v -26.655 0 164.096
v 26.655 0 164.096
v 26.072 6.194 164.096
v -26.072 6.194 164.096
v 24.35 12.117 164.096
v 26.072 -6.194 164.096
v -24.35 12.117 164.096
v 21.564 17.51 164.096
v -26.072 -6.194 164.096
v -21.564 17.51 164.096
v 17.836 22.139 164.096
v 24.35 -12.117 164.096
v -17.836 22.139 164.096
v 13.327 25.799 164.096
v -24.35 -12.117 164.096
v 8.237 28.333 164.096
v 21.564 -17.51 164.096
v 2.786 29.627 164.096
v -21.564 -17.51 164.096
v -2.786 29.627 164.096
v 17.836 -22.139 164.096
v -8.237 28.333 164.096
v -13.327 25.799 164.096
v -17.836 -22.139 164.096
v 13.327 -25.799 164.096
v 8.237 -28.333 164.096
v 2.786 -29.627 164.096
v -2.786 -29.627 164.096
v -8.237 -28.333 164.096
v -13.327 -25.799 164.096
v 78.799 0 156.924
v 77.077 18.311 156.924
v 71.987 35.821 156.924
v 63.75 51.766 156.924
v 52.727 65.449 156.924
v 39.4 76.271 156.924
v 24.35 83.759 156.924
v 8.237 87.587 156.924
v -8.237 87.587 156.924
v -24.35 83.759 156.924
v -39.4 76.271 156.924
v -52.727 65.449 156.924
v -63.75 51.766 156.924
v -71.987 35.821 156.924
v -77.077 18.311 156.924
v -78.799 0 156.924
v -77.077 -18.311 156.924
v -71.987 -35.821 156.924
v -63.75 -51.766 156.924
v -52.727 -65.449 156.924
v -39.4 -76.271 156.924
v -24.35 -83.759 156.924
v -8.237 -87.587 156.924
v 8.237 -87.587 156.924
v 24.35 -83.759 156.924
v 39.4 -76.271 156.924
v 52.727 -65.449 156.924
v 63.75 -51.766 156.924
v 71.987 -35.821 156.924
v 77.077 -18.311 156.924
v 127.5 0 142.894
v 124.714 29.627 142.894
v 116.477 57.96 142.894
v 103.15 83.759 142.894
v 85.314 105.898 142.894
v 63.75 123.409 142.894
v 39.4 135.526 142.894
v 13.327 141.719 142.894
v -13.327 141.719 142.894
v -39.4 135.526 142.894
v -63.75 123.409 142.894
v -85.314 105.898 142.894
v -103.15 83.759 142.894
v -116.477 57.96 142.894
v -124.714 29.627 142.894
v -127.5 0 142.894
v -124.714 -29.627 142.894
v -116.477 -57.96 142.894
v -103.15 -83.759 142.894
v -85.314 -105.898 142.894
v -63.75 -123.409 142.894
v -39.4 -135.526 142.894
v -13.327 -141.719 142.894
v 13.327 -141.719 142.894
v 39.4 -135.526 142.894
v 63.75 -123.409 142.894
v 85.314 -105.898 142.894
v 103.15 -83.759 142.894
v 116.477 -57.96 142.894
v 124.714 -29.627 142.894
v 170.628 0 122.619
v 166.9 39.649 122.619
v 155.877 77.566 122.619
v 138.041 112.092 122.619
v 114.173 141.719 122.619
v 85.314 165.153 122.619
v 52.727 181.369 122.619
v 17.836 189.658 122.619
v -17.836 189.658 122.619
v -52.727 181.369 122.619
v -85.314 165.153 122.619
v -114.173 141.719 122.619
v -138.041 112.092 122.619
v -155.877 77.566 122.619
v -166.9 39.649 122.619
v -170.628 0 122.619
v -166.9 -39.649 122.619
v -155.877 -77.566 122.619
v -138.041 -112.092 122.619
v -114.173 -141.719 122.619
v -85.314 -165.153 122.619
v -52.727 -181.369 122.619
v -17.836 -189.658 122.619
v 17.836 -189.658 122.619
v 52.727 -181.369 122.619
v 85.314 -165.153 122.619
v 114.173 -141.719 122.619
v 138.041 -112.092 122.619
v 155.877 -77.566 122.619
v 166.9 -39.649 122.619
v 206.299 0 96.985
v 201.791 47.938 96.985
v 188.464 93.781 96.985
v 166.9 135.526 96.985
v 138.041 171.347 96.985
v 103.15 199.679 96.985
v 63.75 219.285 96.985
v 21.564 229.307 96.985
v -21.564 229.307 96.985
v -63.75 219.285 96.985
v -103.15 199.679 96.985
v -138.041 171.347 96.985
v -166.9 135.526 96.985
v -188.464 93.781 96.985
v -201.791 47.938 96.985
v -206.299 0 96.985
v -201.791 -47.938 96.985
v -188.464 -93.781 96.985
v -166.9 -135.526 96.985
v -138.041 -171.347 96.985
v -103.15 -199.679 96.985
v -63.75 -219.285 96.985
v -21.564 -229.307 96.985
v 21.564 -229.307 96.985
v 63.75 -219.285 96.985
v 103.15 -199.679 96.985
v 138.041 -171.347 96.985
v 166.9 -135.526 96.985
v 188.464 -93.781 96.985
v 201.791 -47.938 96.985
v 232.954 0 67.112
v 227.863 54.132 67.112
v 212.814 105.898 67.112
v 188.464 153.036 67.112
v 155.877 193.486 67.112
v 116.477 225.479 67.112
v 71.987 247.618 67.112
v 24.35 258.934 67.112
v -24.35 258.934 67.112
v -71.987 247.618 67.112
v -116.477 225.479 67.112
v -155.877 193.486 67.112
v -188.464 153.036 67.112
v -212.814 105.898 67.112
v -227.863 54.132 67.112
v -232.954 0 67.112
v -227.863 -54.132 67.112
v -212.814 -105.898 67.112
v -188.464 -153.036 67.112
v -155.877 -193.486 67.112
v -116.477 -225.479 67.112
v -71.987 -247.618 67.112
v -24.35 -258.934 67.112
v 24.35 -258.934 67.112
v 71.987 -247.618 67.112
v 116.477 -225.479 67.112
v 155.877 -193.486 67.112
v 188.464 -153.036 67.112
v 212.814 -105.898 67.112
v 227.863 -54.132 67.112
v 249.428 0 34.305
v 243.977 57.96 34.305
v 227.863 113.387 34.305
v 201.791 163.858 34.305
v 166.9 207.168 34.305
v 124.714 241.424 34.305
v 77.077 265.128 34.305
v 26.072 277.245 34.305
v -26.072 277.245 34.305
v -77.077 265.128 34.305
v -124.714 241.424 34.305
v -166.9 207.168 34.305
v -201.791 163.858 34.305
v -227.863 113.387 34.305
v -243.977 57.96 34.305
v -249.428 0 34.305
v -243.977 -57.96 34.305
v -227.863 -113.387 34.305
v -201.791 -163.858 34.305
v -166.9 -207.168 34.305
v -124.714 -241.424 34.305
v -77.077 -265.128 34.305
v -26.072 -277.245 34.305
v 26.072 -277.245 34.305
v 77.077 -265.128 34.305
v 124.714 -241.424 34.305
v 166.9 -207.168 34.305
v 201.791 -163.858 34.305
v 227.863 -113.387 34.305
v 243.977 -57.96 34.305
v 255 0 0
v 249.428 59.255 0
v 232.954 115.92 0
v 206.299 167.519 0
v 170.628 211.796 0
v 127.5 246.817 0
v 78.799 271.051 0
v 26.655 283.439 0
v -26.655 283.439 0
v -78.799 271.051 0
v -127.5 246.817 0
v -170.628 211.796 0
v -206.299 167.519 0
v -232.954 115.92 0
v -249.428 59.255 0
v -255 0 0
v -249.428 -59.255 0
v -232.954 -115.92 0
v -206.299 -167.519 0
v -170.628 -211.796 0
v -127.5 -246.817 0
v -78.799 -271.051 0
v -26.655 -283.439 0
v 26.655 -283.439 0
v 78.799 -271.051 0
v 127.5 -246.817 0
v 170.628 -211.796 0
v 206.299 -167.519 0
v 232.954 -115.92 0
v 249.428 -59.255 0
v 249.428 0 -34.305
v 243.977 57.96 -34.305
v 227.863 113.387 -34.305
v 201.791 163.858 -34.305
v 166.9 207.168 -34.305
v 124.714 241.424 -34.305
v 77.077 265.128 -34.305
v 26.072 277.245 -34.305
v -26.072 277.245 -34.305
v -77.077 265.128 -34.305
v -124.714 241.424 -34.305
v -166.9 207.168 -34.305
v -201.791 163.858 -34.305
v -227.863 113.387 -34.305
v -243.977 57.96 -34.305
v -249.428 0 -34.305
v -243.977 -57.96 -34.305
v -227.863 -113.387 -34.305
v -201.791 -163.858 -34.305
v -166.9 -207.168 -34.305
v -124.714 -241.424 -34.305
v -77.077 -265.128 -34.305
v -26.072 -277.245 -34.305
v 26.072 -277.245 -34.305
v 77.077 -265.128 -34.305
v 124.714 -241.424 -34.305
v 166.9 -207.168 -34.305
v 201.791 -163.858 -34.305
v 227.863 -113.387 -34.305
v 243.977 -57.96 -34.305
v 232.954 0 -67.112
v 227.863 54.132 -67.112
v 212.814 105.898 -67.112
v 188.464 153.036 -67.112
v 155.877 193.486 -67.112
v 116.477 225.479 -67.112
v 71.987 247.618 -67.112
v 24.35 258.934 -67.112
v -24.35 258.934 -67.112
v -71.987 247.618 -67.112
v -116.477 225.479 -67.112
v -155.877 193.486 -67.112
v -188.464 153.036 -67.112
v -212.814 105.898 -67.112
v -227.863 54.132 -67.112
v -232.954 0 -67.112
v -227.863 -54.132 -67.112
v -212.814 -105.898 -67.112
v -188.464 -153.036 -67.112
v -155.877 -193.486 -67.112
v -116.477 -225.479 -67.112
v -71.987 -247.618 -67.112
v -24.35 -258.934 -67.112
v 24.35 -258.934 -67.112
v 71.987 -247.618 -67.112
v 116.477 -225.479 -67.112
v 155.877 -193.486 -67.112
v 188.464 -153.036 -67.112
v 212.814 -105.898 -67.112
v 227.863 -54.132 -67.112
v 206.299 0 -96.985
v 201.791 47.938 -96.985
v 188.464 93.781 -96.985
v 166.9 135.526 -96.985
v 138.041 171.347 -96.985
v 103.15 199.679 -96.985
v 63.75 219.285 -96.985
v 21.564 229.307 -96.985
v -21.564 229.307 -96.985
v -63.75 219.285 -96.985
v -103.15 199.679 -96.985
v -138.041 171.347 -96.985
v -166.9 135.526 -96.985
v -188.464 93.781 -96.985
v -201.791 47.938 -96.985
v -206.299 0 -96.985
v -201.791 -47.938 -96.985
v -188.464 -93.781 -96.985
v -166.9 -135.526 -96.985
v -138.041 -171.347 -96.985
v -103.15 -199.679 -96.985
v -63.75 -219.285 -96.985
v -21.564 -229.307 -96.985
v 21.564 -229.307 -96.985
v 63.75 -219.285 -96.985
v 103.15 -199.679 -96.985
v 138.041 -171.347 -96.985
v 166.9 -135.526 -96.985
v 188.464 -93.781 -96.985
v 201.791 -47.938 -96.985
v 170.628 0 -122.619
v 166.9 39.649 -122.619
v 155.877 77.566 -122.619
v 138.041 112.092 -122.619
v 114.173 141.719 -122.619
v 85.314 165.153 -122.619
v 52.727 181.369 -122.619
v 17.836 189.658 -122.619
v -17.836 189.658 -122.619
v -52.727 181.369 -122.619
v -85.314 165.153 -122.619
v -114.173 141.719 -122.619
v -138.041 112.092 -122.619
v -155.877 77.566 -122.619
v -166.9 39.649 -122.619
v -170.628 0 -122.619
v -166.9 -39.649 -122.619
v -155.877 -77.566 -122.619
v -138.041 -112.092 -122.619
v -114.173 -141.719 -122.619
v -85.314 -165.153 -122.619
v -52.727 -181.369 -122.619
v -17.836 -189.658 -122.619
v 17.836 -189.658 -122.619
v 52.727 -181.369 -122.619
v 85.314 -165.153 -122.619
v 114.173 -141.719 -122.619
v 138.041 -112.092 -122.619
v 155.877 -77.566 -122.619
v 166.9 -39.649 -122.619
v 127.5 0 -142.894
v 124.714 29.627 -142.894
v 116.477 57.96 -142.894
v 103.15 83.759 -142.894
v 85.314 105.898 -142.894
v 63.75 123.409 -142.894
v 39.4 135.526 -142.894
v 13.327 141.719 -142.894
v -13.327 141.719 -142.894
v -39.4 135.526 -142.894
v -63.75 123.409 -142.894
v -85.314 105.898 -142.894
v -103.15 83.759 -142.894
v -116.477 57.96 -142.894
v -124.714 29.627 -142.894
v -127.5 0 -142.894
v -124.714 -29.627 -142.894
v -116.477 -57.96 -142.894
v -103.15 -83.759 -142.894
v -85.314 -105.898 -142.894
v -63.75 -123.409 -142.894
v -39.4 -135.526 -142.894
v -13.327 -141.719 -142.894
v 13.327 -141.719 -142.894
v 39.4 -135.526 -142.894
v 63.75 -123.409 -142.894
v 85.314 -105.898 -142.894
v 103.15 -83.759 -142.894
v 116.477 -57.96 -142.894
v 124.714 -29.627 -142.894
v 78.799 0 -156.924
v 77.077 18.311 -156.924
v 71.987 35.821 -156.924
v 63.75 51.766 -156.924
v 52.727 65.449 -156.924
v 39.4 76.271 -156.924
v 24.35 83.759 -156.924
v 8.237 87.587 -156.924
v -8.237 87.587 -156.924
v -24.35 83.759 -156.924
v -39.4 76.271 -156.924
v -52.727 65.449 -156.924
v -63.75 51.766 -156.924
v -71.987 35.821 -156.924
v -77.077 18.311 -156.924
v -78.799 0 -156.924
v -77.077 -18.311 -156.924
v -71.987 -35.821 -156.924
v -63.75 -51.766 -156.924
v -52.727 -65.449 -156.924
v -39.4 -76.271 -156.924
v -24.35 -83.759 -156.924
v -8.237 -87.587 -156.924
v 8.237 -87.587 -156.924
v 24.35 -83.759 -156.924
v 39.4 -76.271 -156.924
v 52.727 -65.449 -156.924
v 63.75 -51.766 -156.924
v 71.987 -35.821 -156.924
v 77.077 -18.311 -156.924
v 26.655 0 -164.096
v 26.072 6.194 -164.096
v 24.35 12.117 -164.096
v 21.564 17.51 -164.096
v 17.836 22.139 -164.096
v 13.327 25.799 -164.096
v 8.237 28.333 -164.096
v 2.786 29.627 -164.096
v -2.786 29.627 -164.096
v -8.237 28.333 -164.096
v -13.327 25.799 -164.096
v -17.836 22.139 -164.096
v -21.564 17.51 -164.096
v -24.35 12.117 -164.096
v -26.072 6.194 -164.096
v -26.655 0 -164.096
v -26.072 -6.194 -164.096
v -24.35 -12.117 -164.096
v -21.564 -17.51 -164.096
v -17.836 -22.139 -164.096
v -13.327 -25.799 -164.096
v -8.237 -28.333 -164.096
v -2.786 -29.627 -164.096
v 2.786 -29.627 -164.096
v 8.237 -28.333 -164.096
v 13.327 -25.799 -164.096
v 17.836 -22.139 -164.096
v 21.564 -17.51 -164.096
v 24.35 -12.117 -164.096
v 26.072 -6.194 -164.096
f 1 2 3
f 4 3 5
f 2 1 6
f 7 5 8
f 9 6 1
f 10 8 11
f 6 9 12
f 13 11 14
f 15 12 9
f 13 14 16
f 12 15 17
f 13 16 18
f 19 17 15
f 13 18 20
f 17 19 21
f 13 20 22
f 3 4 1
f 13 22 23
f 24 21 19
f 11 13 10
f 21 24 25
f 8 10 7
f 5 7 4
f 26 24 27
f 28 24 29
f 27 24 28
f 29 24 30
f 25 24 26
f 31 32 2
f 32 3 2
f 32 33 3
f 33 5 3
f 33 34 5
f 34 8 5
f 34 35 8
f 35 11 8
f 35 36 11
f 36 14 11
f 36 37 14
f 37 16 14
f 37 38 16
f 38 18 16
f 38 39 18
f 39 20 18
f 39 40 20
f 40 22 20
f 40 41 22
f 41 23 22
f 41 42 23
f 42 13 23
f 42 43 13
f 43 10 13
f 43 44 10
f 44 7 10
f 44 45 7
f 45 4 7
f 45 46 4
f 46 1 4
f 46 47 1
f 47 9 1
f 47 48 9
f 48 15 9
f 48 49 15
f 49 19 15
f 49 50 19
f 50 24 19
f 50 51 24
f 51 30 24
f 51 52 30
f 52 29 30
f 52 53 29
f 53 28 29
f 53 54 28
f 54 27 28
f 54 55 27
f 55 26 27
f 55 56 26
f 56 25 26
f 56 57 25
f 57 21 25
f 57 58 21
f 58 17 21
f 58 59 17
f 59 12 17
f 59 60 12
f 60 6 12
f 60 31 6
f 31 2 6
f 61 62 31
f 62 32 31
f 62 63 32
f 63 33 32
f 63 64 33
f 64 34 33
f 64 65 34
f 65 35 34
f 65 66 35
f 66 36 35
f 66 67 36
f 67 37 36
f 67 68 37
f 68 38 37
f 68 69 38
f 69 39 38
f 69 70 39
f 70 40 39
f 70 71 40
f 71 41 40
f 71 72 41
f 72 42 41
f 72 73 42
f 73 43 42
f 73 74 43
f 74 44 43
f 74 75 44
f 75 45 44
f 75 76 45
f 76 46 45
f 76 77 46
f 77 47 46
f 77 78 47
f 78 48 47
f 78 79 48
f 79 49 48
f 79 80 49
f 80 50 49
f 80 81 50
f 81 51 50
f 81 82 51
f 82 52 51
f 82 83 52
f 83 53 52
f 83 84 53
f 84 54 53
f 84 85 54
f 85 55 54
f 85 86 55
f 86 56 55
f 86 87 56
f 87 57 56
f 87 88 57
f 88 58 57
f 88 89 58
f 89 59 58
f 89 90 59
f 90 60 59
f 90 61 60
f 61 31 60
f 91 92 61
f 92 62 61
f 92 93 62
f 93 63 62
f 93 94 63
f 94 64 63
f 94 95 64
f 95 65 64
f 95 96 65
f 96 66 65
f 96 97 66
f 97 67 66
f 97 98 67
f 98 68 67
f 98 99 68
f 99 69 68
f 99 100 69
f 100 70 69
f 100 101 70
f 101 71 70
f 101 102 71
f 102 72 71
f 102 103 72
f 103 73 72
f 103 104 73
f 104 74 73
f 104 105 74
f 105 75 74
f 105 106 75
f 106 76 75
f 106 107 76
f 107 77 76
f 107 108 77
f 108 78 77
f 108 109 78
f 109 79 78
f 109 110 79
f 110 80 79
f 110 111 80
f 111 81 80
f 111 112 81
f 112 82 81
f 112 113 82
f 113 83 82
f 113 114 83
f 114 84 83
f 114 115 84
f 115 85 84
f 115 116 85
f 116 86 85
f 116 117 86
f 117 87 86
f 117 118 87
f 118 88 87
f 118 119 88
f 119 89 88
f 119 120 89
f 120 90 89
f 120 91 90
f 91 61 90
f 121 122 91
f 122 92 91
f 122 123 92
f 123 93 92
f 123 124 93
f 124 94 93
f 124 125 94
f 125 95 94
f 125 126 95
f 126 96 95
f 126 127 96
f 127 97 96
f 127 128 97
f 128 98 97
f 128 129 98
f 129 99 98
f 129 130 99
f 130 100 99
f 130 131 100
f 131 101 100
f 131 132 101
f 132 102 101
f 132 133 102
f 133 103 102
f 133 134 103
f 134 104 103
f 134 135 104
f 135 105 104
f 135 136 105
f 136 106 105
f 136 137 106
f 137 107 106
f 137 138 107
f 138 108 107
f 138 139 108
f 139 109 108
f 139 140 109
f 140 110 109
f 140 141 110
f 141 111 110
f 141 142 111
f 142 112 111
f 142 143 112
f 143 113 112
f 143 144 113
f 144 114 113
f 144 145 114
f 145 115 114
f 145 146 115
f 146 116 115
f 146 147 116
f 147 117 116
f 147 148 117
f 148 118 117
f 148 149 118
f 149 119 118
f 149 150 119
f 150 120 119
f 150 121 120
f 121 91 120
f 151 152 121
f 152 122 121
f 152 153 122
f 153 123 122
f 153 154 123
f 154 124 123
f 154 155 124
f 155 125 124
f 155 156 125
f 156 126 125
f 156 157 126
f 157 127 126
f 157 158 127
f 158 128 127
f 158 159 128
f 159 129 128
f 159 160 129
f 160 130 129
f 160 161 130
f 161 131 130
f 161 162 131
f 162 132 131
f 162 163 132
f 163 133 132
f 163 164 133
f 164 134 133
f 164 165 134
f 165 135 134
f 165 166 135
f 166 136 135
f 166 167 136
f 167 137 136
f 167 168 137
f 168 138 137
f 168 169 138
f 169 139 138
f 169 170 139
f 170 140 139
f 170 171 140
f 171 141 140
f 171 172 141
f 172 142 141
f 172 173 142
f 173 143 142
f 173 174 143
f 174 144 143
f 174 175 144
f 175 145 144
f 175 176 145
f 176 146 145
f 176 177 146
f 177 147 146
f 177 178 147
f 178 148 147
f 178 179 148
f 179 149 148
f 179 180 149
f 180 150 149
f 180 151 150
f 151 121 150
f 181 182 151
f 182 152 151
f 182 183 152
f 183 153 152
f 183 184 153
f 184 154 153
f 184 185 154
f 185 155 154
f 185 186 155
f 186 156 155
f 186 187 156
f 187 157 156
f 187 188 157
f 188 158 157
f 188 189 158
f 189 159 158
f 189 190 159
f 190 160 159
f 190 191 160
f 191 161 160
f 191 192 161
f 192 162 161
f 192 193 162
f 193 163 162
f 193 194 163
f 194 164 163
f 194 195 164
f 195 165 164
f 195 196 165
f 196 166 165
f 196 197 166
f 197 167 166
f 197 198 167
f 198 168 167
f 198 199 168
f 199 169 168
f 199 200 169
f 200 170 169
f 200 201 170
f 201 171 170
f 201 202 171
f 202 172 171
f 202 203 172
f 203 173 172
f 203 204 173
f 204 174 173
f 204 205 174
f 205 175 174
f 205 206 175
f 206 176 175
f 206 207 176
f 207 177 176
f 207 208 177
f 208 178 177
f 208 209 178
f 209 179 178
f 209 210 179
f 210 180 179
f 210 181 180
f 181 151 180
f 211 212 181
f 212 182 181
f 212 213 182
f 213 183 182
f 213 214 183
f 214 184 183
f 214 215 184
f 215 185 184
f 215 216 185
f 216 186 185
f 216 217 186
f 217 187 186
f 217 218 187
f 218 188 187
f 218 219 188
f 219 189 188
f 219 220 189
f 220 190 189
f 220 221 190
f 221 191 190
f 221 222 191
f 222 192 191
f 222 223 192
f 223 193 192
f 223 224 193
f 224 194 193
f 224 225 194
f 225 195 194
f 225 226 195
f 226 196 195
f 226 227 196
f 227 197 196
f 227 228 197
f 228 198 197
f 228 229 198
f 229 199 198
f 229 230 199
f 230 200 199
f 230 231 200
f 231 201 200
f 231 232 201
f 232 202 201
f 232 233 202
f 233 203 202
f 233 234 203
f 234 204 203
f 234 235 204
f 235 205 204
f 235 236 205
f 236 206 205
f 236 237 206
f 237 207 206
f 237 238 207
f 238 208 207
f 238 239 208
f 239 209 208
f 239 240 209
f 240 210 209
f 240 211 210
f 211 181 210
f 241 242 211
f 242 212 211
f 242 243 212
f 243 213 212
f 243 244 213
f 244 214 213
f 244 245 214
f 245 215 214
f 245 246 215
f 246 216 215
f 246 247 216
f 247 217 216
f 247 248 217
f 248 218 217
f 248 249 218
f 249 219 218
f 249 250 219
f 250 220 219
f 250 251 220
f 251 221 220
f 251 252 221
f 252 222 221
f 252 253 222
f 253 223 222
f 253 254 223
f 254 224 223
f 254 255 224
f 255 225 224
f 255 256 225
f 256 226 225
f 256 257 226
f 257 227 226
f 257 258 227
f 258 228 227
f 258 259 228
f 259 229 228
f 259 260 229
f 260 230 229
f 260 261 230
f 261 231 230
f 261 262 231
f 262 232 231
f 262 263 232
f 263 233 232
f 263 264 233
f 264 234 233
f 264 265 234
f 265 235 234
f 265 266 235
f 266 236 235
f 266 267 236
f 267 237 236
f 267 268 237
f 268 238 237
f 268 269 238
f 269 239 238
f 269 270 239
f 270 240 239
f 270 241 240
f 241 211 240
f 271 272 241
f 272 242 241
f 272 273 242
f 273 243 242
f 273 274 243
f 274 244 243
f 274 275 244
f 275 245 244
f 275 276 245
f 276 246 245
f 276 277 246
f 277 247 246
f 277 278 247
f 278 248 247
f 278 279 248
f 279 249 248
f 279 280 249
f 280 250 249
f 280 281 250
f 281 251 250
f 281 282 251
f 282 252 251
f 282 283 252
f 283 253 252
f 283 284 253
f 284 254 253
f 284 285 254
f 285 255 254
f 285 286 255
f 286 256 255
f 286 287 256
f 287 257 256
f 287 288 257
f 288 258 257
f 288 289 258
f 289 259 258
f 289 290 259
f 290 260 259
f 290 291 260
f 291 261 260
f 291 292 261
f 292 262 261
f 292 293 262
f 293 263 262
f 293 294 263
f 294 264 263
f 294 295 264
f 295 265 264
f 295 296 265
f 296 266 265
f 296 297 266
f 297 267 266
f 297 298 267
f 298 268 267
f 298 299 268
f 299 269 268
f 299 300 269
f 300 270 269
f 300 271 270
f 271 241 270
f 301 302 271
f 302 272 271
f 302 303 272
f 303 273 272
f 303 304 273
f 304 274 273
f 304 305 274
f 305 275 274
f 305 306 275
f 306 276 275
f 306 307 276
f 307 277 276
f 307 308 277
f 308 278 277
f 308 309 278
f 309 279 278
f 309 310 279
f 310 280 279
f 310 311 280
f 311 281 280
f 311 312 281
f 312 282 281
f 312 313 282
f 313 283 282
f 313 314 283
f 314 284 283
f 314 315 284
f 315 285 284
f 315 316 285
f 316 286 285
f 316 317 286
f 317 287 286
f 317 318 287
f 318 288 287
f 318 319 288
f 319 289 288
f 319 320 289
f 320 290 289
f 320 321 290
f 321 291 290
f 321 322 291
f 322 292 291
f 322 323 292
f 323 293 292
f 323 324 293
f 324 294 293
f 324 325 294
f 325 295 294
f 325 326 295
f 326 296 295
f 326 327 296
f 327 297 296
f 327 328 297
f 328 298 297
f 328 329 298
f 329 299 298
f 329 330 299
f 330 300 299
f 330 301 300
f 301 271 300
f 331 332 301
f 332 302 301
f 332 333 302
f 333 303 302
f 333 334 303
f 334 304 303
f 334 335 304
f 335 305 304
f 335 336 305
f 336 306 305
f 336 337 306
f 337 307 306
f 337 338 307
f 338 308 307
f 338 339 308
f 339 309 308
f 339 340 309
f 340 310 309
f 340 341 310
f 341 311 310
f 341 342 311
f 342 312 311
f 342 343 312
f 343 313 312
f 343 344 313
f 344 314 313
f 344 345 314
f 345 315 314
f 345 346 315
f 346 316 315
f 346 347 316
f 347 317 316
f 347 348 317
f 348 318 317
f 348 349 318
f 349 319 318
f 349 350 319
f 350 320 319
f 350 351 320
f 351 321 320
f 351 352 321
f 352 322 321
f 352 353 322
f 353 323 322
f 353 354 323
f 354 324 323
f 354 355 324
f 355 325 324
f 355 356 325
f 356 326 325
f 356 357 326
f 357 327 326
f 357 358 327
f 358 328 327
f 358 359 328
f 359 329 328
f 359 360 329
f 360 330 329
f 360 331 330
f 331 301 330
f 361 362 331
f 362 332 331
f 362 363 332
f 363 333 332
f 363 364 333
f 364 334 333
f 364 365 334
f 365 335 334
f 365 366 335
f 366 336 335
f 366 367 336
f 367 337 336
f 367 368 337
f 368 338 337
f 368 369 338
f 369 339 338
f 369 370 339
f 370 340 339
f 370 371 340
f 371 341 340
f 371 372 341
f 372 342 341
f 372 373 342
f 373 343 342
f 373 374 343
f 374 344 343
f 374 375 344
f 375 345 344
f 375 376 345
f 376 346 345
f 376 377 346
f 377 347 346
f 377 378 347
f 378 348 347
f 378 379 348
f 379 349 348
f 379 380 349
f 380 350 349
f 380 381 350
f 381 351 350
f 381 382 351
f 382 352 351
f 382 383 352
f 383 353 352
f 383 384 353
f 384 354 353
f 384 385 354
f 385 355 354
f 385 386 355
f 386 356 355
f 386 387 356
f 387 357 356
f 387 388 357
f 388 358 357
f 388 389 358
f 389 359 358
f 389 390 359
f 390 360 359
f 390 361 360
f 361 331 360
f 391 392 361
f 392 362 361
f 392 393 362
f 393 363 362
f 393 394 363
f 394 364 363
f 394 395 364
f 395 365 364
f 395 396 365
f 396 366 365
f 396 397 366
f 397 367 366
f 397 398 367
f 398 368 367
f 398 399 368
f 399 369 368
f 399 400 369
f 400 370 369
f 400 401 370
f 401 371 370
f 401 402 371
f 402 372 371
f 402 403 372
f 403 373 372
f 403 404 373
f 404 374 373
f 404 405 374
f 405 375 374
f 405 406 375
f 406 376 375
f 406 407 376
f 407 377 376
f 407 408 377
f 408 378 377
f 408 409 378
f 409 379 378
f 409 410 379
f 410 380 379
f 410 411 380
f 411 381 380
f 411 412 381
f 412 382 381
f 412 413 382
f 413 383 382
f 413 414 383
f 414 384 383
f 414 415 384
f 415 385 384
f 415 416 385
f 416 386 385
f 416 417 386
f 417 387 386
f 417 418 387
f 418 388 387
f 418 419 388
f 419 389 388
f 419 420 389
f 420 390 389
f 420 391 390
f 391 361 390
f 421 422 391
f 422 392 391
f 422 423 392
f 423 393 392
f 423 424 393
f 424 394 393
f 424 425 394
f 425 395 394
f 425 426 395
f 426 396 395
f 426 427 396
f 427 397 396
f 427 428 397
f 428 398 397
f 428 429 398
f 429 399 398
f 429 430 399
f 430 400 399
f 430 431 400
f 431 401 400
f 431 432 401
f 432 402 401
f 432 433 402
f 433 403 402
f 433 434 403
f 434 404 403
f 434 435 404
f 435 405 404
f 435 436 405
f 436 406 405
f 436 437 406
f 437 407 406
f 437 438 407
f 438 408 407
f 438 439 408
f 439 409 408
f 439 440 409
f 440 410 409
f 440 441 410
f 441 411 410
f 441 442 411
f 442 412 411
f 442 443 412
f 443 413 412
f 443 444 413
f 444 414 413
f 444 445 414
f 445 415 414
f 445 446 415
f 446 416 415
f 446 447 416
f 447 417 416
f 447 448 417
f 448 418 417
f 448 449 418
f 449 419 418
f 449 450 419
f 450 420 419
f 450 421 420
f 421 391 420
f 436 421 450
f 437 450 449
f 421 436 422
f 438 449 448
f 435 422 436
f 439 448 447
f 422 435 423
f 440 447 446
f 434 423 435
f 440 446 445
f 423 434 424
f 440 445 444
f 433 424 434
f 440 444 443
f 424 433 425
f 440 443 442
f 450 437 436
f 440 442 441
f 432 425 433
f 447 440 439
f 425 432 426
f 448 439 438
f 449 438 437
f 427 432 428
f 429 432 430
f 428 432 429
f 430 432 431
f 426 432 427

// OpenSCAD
// Generated by SolidPython 1.0.1 on 2020-07-29 00:46:53


scale(v = [17, 19, 11]) {
	sphere(r = 15);
}
/***********************************************
*********      SolidPython code:      **********
************************************************
 
# import packages: SolidPython
from solid import *
from solid.utils import *
from itertools import chain, combinations, permutations


class Resize:

    def __init__(self, scad_file):
        self.scad_file = scad_file
        #self.scad_file = import_scad(scad_file)
        # cone/cylinder param:
        self.r1 = 0
        self.r2 = 0
        self.h = 0
        # rectangular prism param:
        self.w = 0
        self.l = 0
        # ellipse param:
        self.r = 0

    # import OpenScad code (file name corresponds to shape)


    # classify shape + parameters
    def assign(self, param1, param2, param3):
        if self.scad_file == 'cone.scad':
            self.r1 = param1
            self.r2 = param2
            self.h = param3
        elif self.scad_file == 'cylinder.scad':
            self.r1 = param1
            self.r2 = param2
            self.h = param3
        elif self.scad_file == 'rectangularPrism.scad':
            self.h = param1
            self.l = param2
            self.w = param3
        else:
            self.r = param1
            self.h = param2

    # resize parameters
    def iterate(self):
        x = range(3, 20, 2)
        i = 1
        if self.scad_file == 'cone.scad':
            tempList = list(permutations(x, 2))
            for temp in tempList:
                param1 = temp[0]
                param2 = temp[1]
                filepath = 'produced_scad_files/' + 'cone' + str(param1) + '_' + str(param2) + '_' + '.scad'
                scad_render_to_file(cylinder(h=param1, r1=param2, r2=0), filepath)

        elif self.scad_file == 'cylinder.scad':
            tempList = list(permutations(x, 3))
            for temp in tempList:
                param1 = temp[0]
                param2 = temp[1]
                filepath = 'produced_scad_files/' + 'cylinder' + str(param1) + '_' + str(param2) + '_' + '.scad'
                scad_render_to_file(cylinder(h=param1, r1=param2, r2=param2), filepath)

        elif self.scad_file == 'rectangularPrism.scad':
            tempList = list(permutations(x, 3))
            for temp in tempList:
                param1 = temp[0]
                param2 = temp[1]
                param3 = temp[2]
                filepath = 'produced_scad_files/' + 'rectangularPrism' + str(param1) + '_' + str(param2) + '_' + str(
                    param3) + '.scad'
                scad_render_to_file(cube(size=(param1, param2, param3)), filepath)

        elif self.scad_file == 'ellipse.scad':
            tempList = list(permutations(x, 4))
            for temp in tempList:
                param1 = temp[0]
                param2 = temp[1]
                param3 = temp[2]
                param4 = temp[3]
                filepath = 'produced_scad_files/' + 'ellipse' + str(param1) + '_' + str(param2) + '_' + str(param3) + '_' + str(param4) + '.scad'
                scad_render_to_file(scale([param1, param2, param3])(sphere(r=param4)), filepath)

    def render_to_scadfile(self):
        scad_render_to_file(scad, 'example.scad') 
 
************************************************/
